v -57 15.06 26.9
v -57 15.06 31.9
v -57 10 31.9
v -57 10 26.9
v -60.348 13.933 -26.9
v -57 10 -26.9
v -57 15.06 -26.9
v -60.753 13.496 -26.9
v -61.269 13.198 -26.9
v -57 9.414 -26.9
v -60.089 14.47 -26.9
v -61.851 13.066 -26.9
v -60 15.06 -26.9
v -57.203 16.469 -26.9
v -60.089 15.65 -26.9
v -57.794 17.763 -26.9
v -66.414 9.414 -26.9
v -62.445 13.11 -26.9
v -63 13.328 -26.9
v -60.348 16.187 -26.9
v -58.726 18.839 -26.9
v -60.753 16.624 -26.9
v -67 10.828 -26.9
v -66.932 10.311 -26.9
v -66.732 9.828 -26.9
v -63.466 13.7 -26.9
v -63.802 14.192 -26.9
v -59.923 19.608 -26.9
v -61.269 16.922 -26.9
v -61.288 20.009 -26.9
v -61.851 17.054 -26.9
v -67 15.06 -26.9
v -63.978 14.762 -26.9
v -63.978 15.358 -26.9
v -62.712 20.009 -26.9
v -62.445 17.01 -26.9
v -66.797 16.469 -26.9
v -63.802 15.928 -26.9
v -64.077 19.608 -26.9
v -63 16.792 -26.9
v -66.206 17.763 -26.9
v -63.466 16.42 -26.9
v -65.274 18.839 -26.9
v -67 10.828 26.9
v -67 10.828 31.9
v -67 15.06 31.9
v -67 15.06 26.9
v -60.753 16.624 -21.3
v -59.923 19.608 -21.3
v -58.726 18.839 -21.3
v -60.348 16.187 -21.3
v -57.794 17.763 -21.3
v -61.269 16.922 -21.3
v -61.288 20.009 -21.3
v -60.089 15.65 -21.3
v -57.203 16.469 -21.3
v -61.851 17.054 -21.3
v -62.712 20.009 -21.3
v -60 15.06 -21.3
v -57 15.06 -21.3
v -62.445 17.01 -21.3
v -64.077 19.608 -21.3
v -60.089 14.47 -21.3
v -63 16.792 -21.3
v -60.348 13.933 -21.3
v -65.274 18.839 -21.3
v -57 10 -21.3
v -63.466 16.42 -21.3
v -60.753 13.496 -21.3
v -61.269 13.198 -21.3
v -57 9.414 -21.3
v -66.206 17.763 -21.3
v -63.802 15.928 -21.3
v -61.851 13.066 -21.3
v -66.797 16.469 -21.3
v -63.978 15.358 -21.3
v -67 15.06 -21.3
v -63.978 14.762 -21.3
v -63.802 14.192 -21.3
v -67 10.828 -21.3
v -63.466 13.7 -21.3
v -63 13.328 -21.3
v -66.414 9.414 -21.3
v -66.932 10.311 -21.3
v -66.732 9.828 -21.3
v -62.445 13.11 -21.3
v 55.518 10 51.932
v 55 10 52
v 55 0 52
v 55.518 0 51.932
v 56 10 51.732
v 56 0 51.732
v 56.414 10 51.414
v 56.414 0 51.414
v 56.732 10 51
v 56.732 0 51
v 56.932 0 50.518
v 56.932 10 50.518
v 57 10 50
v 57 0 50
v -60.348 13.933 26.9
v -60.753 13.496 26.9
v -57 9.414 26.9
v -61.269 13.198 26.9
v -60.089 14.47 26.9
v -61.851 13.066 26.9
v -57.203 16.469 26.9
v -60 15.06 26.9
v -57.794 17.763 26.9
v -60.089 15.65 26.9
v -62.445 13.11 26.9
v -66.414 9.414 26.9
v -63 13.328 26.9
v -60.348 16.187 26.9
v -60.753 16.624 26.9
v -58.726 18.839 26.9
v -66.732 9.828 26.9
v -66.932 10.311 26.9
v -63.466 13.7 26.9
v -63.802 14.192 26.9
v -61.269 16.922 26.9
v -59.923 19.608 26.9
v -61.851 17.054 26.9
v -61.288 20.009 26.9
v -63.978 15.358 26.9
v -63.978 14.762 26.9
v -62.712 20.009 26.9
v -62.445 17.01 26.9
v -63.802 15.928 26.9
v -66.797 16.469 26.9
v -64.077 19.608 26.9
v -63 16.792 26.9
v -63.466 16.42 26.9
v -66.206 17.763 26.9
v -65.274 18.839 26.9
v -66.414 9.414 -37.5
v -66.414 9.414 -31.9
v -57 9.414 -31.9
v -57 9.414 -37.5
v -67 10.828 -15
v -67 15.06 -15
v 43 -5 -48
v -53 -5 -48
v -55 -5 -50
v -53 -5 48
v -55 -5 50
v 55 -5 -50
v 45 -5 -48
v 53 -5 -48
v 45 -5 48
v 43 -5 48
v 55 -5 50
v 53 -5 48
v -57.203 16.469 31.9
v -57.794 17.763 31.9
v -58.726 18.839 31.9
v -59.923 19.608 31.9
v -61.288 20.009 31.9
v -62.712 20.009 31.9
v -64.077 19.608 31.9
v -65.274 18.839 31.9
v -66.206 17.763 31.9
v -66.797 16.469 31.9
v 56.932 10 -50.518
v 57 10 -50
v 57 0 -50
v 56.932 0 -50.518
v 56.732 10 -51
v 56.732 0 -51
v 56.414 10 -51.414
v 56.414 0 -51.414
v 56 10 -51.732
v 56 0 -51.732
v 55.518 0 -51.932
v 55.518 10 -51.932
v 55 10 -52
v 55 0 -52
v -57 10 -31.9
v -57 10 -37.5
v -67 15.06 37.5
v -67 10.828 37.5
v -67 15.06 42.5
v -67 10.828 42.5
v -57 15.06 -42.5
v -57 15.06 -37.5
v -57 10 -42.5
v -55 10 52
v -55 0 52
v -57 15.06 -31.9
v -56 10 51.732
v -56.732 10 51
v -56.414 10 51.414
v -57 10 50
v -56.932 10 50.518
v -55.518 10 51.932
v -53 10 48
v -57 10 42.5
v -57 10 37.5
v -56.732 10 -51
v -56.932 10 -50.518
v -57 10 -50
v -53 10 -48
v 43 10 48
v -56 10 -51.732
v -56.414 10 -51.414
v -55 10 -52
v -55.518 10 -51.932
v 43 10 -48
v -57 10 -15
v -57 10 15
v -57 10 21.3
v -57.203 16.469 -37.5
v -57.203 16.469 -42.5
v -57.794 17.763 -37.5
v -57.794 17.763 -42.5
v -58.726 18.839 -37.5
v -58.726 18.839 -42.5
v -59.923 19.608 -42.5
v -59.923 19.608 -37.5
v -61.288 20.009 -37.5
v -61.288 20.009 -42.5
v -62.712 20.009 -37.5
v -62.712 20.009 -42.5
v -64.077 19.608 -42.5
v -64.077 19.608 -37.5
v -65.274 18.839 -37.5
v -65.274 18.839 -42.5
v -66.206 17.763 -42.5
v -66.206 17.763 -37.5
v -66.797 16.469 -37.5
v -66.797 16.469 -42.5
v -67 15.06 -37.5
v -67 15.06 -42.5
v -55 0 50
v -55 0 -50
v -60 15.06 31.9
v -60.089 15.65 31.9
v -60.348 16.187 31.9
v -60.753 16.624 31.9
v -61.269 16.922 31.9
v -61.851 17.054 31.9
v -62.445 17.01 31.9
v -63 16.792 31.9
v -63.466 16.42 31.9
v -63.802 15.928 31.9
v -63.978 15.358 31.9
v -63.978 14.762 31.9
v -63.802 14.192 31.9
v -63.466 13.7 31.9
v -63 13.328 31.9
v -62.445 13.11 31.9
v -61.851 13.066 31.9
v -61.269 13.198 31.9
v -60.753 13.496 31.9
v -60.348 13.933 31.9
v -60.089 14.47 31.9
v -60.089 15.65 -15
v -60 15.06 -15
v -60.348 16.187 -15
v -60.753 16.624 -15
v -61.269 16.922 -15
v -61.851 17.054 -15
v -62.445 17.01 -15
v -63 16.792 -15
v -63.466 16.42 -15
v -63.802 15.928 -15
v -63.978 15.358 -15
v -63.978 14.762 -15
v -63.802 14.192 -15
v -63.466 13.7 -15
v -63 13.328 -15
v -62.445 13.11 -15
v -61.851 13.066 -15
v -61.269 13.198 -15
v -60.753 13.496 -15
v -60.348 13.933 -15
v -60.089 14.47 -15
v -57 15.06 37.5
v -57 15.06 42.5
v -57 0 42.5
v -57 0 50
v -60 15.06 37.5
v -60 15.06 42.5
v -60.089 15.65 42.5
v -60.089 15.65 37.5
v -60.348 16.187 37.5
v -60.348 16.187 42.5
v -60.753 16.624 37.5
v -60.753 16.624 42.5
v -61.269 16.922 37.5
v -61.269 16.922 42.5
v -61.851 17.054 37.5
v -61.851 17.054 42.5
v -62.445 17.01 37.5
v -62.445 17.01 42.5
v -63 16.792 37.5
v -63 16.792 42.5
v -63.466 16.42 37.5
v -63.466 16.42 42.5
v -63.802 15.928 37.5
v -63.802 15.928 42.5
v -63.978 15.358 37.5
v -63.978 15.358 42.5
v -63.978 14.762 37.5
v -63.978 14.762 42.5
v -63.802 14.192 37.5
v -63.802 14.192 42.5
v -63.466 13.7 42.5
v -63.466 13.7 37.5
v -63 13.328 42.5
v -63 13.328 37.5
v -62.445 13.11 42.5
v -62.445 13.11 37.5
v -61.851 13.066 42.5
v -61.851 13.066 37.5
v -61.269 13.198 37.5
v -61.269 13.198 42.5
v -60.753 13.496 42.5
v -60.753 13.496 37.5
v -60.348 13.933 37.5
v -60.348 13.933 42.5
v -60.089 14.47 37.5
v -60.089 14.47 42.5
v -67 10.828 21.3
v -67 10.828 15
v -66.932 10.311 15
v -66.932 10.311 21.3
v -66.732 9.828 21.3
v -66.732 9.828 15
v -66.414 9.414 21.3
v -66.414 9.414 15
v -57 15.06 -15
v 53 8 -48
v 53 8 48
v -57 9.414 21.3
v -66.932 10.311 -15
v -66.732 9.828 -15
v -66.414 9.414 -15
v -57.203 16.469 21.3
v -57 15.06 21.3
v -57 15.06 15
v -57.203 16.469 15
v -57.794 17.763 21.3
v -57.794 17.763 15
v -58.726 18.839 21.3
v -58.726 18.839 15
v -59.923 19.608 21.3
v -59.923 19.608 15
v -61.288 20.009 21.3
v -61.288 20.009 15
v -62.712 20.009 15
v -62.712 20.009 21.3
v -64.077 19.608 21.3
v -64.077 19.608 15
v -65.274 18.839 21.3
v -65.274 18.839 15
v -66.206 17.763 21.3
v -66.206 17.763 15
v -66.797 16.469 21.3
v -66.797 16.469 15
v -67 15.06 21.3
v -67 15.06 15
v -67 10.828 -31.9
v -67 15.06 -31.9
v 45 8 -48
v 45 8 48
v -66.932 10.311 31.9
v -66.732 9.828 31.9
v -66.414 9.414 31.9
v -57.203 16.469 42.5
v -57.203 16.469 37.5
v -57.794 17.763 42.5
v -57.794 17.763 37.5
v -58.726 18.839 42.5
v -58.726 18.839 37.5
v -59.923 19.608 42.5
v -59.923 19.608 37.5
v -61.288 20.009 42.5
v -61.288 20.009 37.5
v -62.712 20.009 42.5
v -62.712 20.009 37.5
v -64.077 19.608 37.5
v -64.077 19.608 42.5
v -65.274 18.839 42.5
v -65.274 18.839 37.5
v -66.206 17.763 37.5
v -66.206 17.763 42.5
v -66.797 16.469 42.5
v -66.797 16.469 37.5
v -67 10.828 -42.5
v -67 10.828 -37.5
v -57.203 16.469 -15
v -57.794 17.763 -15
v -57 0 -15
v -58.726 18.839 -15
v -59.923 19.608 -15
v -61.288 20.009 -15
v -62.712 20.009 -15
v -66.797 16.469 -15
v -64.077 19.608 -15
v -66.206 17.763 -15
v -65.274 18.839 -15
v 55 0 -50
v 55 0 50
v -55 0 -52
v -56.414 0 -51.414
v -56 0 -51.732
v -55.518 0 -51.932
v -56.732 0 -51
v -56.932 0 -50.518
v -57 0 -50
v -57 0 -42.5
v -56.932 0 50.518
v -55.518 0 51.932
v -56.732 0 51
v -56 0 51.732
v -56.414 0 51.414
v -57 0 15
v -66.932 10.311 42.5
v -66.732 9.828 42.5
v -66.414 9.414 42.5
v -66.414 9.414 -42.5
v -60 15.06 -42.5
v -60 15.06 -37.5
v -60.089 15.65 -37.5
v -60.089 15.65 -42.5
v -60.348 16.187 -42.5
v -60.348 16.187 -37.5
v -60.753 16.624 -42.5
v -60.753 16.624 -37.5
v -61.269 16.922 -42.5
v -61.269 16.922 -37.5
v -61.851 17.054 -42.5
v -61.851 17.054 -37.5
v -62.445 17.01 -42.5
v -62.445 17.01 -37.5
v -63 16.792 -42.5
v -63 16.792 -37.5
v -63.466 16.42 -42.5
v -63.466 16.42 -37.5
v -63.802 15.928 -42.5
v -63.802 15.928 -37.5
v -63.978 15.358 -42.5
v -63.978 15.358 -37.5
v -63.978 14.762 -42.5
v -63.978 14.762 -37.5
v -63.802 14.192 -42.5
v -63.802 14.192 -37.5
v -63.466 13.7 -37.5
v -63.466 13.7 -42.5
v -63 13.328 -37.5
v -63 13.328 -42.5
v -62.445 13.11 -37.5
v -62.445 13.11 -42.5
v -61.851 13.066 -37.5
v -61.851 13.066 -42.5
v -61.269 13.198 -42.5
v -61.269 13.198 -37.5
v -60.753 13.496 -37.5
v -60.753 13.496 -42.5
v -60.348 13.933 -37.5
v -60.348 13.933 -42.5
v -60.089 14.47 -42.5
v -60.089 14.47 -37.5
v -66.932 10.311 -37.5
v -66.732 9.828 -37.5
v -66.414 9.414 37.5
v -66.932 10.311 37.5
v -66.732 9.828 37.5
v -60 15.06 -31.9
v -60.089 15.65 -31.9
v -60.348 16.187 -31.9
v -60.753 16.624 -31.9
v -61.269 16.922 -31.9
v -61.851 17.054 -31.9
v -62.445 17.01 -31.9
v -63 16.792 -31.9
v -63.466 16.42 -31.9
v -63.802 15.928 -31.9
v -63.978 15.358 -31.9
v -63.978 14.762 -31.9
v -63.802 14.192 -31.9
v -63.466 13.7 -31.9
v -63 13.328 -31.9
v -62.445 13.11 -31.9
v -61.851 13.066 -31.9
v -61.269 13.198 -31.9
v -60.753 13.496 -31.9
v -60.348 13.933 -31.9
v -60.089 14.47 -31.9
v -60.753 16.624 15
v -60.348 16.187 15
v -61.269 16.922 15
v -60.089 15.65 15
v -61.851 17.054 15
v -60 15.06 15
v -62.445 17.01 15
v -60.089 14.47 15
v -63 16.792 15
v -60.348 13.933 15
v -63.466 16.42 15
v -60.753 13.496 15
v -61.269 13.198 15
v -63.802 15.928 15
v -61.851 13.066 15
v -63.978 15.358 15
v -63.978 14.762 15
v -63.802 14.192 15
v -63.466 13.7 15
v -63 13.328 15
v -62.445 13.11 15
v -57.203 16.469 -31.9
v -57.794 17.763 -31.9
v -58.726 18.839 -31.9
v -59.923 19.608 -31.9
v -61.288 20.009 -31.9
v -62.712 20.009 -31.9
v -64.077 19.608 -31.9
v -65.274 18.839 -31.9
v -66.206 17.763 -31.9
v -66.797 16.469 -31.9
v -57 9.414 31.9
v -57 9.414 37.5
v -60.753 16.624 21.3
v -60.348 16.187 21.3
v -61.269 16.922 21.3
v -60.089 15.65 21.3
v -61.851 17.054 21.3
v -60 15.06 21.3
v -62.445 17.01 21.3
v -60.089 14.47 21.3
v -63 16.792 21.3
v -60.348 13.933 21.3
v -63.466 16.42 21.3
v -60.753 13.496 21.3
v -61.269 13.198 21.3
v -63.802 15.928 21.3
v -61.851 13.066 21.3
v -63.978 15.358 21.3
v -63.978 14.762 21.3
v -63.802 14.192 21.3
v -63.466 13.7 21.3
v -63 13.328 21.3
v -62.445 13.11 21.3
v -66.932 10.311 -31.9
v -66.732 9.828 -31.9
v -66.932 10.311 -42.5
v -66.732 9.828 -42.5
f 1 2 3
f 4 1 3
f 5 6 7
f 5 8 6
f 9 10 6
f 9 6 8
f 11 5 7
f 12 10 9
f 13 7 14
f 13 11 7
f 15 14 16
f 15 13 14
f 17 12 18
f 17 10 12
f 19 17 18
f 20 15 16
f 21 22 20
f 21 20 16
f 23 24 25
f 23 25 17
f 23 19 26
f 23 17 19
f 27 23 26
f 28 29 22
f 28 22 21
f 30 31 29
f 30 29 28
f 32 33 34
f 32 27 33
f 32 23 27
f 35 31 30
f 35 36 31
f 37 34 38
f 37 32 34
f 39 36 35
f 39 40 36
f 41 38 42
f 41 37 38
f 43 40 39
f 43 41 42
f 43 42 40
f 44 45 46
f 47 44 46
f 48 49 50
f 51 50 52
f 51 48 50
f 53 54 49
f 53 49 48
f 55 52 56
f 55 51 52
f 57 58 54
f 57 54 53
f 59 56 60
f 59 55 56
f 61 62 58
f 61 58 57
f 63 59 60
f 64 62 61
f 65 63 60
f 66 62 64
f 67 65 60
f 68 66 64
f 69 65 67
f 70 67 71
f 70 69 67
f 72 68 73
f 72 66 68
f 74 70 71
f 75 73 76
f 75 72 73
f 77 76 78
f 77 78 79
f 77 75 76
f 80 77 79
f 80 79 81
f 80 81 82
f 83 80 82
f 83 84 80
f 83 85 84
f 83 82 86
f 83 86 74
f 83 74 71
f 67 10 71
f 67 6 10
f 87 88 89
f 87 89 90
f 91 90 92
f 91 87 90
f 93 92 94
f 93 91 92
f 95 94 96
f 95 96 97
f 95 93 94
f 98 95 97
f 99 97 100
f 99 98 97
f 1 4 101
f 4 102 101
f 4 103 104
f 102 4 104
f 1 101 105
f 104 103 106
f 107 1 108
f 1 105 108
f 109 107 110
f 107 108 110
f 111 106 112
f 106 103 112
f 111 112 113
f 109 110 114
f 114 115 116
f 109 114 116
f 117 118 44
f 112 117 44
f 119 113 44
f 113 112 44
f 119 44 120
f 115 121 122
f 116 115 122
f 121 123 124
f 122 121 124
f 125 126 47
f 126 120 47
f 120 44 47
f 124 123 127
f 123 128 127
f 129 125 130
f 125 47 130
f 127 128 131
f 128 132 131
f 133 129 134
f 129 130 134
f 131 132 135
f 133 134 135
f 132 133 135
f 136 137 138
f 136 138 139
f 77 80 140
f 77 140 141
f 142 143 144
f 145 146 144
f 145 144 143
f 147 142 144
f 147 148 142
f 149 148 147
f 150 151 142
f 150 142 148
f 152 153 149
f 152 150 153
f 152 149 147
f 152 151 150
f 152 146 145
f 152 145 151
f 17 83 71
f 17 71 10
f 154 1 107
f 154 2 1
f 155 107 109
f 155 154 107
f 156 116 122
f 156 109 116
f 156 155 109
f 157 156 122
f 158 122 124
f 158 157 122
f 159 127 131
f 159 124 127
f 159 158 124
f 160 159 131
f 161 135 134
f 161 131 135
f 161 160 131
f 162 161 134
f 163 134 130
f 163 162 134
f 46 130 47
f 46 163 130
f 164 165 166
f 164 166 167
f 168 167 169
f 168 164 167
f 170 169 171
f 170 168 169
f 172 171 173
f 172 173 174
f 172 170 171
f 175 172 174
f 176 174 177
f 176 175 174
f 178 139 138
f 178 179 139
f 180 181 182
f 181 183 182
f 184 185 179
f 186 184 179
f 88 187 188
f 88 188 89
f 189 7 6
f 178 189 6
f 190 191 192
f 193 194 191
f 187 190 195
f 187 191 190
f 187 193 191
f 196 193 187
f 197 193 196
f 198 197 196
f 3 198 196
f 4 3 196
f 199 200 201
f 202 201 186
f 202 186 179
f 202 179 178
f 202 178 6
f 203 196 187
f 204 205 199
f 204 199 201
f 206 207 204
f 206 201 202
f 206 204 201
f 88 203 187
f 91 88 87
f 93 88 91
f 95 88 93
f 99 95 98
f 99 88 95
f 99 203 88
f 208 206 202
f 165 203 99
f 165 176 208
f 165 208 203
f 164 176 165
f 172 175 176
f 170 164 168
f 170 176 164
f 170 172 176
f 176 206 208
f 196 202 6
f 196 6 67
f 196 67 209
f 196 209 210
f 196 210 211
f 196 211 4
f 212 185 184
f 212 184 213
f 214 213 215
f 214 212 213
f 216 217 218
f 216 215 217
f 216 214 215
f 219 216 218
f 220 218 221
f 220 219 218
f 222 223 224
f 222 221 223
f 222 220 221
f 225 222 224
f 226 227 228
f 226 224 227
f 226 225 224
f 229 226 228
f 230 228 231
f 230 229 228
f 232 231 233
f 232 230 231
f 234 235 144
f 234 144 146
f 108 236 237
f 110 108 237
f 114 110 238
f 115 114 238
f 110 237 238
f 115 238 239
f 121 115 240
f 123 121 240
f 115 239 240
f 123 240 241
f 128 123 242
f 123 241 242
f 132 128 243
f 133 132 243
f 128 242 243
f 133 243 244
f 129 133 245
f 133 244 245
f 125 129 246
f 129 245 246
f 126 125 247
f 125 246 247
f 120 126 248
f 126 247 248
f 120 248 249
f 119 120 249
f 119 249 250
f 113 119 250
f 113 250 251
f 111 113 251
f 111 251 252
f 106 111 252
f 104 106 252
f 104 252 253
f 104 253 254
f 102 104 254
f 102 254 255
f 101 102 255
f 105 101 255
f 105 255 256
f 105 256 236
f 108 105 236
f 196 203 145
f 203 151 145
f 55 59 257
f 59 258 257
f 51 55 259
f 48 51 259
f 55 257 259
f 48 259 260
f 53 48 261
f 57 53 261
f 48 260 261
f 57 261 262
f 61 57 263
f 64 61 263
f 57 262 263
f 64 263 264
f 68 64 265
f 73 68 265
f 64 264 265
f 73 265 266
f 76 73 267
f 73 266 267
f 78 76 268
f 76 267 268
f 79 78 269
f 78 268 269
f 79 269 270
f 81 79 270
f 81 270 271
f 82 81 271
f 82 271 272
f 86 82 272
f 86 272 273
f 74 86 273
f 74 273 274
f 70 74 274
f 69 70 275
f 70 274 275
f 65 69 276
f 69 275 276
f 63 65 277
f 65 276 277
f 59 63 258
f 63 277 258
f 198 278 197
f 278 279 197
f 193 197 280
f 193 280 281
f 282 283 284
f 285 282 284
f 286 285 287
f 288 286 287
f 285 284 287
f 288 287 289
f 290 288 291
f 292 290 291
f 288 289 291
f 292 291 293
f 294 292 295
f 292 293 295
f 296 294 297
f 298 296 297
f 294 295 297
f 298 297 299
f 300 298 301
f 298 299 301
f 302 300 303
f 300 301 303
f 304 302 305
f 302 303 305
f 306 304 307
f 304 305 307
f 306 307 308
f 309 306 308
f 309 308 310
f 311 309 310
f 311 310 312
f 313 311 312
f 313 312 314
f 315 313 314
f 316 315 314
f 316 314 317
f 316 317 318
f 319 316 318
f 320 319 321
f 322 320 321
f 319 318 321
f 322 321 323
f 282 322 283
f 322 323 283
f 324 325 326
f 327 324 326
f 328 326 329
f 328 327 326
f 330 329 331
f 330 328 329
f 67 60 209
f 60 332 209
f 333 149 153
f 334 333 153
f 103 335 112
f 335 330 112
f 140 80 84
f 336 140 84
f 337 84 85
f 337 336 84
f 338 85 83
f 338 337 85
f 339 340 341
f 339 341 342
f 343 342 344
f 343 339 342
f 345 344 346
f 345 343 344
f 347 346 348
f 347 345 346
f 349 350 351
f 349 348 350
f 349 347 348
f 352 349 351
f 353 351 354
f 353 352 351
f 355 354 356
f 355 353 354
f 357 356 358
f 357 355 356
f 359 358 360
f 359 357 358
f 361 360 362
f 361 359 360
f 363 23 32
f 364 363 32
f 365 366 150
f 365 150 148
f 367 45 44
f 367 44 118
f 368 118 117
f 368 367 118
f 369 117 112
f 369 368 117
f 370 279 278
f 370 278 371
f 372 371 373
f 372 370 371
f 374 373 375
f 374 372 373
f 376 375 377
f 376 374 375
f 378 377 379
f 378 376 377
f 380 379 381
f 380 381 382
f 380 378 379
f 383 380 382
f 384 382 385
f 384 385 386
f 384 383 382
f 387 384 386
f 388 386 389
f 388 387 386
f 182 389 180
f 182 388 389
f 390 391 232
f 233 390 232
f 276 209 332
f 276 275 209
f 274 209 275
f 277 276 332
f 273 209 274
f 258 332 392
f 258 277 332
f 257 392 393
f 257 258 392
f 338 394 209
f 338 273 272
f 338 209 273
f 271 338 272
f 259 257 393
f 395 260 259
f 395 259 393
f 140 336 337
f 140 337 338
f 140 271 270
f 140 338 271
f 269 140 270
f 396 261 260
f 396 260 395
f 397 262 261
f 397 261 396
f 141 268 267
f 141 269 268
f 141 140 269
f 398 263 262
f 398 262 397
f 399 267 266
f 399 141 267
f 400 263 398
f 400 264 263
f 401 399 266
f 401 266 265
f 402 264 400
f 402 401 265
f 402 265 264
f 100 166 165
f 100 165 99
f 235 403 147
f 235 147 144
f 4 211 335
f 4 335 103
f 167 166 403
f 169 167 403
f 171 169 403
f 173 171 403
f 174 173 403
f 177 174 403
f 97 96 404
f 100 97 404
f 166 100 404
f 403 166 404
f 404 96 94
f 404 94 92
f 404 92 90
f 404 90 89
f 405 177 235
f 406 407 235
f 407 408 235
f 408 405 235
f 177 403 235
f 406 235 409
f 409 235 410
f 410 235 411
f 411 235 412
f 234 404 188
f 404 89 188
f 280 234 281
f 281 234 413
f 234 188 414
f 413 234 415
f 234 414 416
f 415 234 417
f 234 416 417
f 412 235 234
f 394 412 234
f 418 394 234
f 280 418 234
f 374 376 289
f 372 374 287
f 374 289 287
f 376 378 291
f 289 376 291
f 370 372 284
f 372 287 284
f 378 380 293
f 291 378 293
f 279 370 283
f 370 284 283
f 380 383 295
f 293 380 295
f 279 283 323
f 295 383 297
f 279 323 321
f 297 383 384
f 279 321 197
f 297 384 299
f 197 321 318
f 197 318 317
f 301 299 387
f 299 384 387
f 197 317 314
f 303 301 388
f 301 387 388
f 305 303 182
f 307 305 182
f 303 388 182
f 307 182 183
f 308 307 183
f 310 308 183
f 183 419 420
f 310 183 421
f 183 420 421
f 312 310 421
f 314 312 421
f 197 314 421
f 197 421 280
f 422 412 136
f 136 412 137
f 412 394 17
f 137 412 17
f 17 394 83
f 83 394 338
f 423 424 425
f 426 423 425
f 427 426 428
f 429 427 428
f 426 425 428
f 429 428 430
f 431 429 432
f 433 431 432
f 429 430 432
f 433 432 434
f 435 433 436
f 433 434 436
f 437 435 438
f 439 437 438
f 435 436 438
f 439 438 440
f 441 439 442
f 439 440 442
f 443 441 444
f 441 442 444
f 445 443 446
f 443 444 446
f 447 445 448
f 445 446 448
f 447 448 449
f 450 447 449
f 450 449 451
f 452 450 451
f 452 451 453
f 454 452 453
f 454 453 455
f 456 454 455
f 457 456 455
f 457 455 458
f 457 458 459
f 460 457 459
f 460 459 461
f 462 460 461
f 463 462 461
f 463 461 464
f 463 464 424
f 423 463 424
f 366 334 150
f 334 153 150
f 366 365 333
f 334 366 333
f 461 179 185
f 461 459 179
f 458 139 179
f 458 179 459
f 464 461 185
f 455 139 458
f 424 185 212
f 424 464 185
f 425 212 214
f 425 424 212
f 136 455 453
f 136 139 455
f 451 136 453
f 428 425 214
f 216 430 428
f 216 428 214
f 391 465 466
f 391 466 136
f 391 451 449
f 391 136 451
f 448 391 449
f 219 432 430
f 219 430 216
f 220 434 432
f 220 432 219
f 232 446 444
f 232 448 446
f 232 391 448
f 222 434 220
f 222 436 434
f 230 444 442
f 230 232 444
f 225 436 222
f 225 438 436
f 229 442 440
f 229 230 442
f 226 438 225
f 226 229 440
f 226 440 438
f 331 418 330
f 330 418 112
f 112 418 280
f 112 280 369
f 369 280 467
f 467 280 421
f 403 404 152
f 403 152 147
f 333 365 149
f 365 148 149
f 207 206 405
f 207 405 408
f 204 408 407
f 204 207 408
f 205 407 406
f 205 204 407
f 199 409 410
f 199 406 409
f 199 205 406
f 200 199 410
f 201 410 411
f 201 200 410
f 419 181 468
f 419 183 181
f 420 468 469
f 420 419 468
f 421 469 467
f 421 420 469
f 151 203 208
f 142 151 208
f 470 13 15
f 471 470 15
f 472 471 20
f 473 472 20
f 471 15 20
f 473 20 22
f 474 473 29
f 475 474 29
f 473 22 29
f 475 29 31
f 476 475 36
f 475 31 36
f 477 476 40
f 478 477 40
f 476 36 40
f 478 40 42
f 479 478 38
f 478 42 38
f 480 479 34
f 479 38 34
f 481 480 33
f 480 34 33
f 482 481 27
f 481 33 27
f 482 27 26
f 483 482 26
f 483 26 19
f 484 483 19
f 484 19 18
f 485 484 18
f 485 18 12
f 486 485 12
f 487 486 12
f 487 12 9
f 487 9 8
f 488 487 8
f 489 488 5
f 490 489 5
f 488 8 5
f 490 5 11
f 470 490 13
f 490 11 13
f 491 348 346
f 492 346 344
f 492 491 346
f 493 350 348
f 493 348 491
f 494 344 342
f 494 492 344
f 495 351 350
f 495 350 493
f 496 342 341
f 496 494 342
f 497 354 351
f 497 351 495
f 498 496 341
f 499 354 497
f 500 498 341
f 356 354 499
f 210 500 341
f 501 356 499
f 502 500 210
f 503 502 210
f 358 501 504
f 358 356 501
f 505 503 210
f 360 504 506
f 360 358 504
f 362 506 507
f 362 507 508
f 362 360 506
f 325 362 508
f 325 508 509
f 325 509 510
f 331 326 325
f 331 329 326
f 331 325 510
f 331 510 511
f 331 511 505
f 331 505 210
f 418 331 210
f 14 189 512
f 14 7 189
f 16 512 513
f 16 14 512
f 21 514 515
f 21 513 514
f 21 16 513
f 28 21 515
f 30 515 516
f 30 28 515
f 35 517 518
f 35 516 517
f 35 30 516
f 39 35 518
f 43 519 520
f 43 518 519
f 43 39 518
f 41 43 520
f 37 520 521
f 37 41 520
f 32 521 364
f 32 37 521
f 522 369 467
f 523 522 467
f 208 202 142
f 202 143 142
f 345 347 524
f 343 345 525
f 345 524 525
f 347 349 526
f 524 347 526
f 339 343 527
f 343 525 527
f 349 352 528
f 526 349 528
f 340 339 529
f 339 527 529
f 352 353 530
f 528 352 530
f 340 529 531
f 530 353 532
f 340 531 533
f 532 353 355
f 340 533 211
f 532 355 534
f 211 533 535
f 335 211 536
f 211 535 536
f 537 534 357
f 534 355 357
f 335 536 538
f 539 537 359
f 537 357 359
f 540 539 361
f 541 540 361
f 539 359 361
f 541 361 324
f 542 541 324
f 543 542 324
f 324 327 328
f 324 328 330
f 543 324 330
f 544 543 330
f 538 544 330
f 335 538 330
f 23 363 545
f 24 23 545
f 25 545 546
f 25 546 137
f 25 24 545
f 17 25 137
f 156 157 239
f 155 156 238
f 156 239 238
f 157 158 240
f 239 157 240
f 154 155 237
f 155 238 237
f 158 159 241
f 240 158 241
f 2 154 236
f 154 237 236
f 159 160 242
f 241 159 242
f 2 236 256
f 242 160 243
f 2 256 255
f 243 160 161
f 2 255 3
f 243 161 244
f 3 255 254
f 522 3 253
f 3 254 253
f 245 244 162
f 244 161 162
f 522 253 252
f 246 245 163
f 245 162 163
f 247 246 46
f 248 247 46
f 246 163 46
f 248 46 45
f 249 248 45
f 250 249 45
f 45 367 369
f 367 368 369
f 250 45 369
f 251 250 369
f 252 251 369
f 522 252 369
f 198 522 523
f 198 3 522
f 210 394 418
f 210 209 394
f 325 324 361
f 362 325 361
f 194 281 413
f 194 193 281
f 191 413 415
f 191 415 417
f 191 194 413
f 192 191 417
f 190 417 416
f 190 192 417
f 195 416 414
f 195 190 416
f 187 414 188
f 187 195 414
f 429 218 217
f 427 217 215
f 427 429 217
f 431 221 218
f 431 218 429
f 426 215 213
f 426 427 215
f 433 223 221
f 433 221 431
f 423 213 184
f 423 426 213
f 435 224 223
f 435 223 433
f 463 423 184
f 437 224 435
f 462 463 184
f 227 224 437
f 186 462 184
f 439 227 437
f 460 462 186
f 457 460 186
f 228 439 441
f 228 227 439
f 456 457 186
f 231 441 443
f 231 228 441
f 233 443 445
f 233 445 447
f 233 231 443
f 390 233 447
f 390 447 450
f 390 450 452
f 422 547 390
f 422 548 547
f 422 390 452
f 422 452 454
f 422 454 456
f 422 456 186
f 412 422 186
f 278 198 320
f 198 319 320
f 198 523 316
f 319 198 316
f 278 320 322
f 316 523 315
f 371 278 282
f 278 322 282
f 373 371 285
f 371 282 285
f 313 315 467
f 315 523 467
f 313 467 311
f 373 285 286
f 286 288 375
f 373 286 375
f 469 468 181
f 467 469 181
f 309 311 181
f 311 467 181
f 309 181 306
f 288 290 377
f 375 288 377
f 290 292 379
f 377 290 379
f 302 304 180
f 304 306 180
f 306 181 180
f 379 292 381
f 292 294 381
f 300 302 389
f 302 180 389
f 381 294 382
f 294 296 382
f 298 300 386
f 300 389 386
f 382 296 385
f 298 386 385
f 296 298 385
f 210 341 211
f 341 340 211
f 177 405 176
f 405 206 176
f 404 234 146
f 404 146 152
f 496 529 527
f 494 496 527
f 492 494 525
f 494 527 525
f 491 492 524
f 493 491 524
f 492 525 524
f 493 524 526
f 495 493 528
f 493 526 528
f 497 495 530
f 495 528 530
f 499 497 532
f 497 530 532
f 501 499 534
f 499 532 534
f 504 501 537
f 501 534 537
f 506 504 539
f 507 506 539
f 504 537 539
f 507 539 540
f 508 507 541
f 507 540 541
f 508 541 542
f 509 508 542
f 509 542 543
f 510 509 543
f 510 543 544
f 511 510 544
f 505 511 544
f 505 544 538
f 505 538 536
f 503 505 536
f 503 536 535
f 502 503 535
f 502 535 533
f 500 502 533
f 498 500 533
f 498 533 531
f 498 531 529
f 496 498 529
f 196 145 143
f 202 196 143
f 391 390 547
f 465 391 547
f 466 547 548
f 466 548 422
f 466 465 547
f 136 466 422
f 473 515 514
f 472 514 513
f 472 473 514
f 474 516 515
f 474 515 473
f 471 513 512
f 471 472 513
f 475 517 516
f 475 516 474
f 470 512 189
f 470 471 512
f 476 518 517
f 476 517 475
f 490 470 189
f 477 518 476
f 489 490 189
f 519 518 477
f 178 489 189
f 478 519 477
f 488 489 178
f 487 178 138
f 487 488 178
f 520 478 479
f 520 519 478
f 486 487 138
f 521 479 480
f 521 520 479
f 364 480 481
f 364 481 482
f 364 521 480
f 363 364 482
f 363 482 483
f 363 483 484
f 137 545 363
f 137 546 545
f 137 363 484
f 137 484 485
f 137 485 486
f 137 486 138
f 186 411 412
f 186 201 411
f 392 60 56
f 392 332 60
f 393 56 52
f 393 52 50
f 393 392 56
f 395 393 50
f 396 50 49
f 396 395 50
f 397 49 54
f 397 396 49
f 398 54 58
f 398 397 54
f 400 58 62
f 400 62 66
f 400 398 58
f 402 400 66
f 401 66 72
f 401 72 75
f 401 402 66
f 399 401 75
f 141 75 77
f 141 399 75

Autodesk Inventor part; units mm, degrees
ref_plane "YZ Plane" through (0, 0, 0) normal (1, 0, 0) x (0, 1, 0)
ref_plane "XZ Plane" through (0, 0, 0) normal (0, 1, 0) x (-1, 0, 0)
ref_plane "XY Plane" through (0, 0, 0) normal (0, 0, 1) x (1, 0, 0)
sketch "Esboço3" plane through (0, 0, 0) normal (0, 1, 0) x (-1, 0, 0)
  line L0 (-57, 52) -> (57, 52)
  line L1 (57, 52) -> (57, -52)
  line L2 (57, -52) -> (-57, -52)
  line L3 (-57, -52) -> (-57, 52)
  line L4 (-57, 52) -> (57, -52) construction
  line L5 (57, 52) -> (-57, -52) construction
  line L6 (-53, 48) -> (53, 48)
  line L7 (53, 48) -> (53, -48)
  line L8 (53, -48) -> (-53, -48)
  line L9 (-53, -48) -> (-53, 48)
  line L10 (-53, 48) -> (53, -48) construction
  line L11 (53, 48) -> (-53, -48) construction
  point P0 (0, 0)
  dimension "d9" = 104
  dimension "d10" = 114
  dimension "d11" = 106
  dimension "d12" = 96
extrude "Extrusão2" add sketch "Esboço3" along normal blind 10
sketch "Esboço4" plane through (0, 0, 0) normal (0, -1, 0) x (1, 0, 0)
  line L0 (-53, -48) -> (53, -48) projected
  line L1 (-53, 48) -> (53, 48)
  line L2 (53, 48) -> (53, -48)
  line L3 (53, -48) -> (-53, -48)
  line L4 (-53, -48) -> (-53, 48)
  line L5 (-53, 48) -> (53, -48) construction
  line L6 (53, 48) -> (-53, -48) construction
  line L7 (-55, 50) -> (55, 50)
  line L8 (55, 50) -> (55, -50)
  line L9 (55, -50) -> (-55, -50)
  line L10 (-55, -50) -> (-55, 50)
  line L11 (-55, 50) -> (55, -50) construction
  line L12 (55, 50) -> (-55, -50) construction
  point P0 (0, 0)
  dimension "d15" = 100
  dimension "d16" = 96
  dimension "d17" = 110
  dimension "d18" = 106
extrude "Extrusão3" add sketch "Esboço4" along normal blind 5
sketch "Esboço5" plane through (0, 10, 0) normal (0, 1, 0) x (1, 0, 0)
  line L0 (53, 48) -> (53, -48) projected
  line L1 (53, -48) -> (43, -48)
  line L2 (43, -48) -> (43, 48)
  line L3 (43, 48) -> (53, 48)
  line L4 (53, 48) -> (53, -48)
  point P0 (0, 0)
  dimension "d21" = 10
extrude "Extrusão4" add sketch "Esboço5" against normal blind 2
sketch "Esboço6" plane through (0, 8, 0) normal (0, -1, 0) x (1, 0, 0)
  line L0 (43, 48) -> (43, -48) projected
  line L1 (43, 48) -> (45, 48)
  line L2 (45, 48) -> (45, -48)
  line L3 (45, -48) -> (43, -48)
  line L4 (43, -48) -> (43, 48)
  point P0 (0, 0)
  dimension "d24" = 2
extrude "Extrusão5" add sketch "Esboço6" along normal blind 13
sketch "Esboço7" plane through (0, 10, 0) normal (0, 1, 0) x (1, 0, 0)
  point P0 (0, 0)
sketch "Esboço9" plane through (-57, 0, 52) normal (0, 0, 1) x (1, 0, 0)
  line L0 (114, 0) -> (0, 0) projected
  line L1 (0, 0) -> (-9.4142, 9.4142)
  line L2 (0, 0) -> (0, 10) projected
  line L3 (0, 10) -> (-10, 10) construction
  line L4 (0, 10) -> (0, 15.06) construction
  line L5 (0, 15.06) -> (-10, 15.06) construction
  arc A0 (0, 15.06) -> (-10, 15.06) centre (-5, 15.06) ccw
  line L6 (-10, 10.8284) -> (-10, 15.06)
  line L7 (0, 15.06) -> (0, 0)
  circle A1 centre (-5, 15.06) radius 2
  arc A2 (-10, 10.8284) -> (-9.4142, 9.4142) centre (-8, 10.8284) ccw
  point P0 (57, 0)
  dimension "d29" = 45
  dimension "d30" = 5.06
  dimension "d31" = 4
  dimension "d32" = 2
extrude "Extrusão6" add sketch "Esboço9" against normal blind 104
sketch "Esboço10" plane through (-67, 10.8284, 52) normal (-1, 0, 0) x (0, 0, 1)
  line L0 (-52, -10.8284) -> (-67, -10.8284) construction
  line L1 (-102, -10.8284) -> (-2, -10.8284) construction
  line L2 (-67, -10.8284) -> (-37, -10.8284) construction
  line L3 (-37, -10.8284) -> (-37, 9.2316) construction
  line L4 (0, 9.2316) -> (-104, 9.2316) construction
  line L5 (-67, 9.2316) -> (-37, 9.2316) construction
  line L6 (-67, -10.8284) -> (-67, 9.2316) construction
  line L7 (-104, 9.2316) -> (-94.5, 9.2316)
  line L8 (-94.5, 9.2316) -> (-94.5, -10.8284)
  line L9 (-94.5, -10.8284) -> (-104, -10.8284)
  line L10 (-104, -10.8284) -> (-104, 9.2316)
  line L11 (0, 9.2316) -> (-9.5, 9.2316)
  line L12 (-9.5, 9.2316) -> (-9.5, -10.8284)
  line L13 (-9.5, -10.8284) -> (0, -10.8284)
  line L14 (0, -10.8284) -> (0, 9.2316)
  line L15 (-67, 9.2316) -> (-37, 9.2316)
  line L16 (-37, 9.2316) -> (-37, -10.8284)
  line L17 (-37, -10.8284) -> (-67, -10.8284)
  line L18 (-67, -10.8284) -> (-67, 9.2316)
  line L19 (-94.5, 9.2316) -> (-89.5, 9.2316) construction
  line L20 (-9.5, 9.2316) -> (-14.5, 9.2316) construction
  line L21 (-89.5, 9.2316) -> (-83.9, 9.2316)
  line L22 (-83.9, 9.2316) -> (-83.9, -1.4142)
  line L23 (-83.9, -1.4142) -> (-89.5, -1.4142)
  line L24 (-89.5, -1.4142) -> (-89.5, 9.2316)
  line L25 (-14.5, 9.2316) -> (-20.1, 9.2316)
  line L26 (-20.1, 9.2316) -> (-20.1, -1.4142)
  line L27 (-20.1, -1.4142) -> (-14.5, -1.4142)
  line L28 (-14.5, -1.4142) -> (-14.5, 9.2316)
  line L29 (-83.9, 9.2316) -> (-78.9, 9.2316)
  line L30 (-20.1, 9.2316) -> (-25.1, 9.2316)
  line L31 (-78.9, 9.2316) -> (-73.3, 9.2316)
  line L32 (-73.3, 9.2316) -> (-73.3, -1.4142)
  line L33 (-73.3, -1.4142) -> (-78.9, -1.4142)
  line L34 (-78.9, -1.4142) -> (-78.9, 9.2316)
  line L35 (-25.1, 9.2316) -> (-30.7, 9.2316)
  line L36 (-30.7, 9.2316) -> (-30.7, -1.4142)
  line L37 (-30.7, -1.4142) -> (-25.1, -1.4142)
  line L38 (-25.1, -1.4142) -> (-25.1, 9.2316)
  dimension "d35" = 15
  dimension "d36" = 30
  dimension "d37" = 9.5
  dimension "d38" = 9.5
  dimension "d39" = 5
  dimension "d40" = 5
  dimension "d41" = 5.6
  dimension "d42" = 5.6
  dimension "d43" = 5
  dimension "d44" = 5
  dimension "d45" = 5.6
  dimension "d46" = 5.6
extrude "Extrusão7" cut sketch "Esboço10" against normal blind 10
fillet "Arredondamento1" radius 2 4 edges at (57, 5, 52) (57, 5, -52) (-57, 5, -52) (-57, 5, 52)
properties part number "tampa extra"
